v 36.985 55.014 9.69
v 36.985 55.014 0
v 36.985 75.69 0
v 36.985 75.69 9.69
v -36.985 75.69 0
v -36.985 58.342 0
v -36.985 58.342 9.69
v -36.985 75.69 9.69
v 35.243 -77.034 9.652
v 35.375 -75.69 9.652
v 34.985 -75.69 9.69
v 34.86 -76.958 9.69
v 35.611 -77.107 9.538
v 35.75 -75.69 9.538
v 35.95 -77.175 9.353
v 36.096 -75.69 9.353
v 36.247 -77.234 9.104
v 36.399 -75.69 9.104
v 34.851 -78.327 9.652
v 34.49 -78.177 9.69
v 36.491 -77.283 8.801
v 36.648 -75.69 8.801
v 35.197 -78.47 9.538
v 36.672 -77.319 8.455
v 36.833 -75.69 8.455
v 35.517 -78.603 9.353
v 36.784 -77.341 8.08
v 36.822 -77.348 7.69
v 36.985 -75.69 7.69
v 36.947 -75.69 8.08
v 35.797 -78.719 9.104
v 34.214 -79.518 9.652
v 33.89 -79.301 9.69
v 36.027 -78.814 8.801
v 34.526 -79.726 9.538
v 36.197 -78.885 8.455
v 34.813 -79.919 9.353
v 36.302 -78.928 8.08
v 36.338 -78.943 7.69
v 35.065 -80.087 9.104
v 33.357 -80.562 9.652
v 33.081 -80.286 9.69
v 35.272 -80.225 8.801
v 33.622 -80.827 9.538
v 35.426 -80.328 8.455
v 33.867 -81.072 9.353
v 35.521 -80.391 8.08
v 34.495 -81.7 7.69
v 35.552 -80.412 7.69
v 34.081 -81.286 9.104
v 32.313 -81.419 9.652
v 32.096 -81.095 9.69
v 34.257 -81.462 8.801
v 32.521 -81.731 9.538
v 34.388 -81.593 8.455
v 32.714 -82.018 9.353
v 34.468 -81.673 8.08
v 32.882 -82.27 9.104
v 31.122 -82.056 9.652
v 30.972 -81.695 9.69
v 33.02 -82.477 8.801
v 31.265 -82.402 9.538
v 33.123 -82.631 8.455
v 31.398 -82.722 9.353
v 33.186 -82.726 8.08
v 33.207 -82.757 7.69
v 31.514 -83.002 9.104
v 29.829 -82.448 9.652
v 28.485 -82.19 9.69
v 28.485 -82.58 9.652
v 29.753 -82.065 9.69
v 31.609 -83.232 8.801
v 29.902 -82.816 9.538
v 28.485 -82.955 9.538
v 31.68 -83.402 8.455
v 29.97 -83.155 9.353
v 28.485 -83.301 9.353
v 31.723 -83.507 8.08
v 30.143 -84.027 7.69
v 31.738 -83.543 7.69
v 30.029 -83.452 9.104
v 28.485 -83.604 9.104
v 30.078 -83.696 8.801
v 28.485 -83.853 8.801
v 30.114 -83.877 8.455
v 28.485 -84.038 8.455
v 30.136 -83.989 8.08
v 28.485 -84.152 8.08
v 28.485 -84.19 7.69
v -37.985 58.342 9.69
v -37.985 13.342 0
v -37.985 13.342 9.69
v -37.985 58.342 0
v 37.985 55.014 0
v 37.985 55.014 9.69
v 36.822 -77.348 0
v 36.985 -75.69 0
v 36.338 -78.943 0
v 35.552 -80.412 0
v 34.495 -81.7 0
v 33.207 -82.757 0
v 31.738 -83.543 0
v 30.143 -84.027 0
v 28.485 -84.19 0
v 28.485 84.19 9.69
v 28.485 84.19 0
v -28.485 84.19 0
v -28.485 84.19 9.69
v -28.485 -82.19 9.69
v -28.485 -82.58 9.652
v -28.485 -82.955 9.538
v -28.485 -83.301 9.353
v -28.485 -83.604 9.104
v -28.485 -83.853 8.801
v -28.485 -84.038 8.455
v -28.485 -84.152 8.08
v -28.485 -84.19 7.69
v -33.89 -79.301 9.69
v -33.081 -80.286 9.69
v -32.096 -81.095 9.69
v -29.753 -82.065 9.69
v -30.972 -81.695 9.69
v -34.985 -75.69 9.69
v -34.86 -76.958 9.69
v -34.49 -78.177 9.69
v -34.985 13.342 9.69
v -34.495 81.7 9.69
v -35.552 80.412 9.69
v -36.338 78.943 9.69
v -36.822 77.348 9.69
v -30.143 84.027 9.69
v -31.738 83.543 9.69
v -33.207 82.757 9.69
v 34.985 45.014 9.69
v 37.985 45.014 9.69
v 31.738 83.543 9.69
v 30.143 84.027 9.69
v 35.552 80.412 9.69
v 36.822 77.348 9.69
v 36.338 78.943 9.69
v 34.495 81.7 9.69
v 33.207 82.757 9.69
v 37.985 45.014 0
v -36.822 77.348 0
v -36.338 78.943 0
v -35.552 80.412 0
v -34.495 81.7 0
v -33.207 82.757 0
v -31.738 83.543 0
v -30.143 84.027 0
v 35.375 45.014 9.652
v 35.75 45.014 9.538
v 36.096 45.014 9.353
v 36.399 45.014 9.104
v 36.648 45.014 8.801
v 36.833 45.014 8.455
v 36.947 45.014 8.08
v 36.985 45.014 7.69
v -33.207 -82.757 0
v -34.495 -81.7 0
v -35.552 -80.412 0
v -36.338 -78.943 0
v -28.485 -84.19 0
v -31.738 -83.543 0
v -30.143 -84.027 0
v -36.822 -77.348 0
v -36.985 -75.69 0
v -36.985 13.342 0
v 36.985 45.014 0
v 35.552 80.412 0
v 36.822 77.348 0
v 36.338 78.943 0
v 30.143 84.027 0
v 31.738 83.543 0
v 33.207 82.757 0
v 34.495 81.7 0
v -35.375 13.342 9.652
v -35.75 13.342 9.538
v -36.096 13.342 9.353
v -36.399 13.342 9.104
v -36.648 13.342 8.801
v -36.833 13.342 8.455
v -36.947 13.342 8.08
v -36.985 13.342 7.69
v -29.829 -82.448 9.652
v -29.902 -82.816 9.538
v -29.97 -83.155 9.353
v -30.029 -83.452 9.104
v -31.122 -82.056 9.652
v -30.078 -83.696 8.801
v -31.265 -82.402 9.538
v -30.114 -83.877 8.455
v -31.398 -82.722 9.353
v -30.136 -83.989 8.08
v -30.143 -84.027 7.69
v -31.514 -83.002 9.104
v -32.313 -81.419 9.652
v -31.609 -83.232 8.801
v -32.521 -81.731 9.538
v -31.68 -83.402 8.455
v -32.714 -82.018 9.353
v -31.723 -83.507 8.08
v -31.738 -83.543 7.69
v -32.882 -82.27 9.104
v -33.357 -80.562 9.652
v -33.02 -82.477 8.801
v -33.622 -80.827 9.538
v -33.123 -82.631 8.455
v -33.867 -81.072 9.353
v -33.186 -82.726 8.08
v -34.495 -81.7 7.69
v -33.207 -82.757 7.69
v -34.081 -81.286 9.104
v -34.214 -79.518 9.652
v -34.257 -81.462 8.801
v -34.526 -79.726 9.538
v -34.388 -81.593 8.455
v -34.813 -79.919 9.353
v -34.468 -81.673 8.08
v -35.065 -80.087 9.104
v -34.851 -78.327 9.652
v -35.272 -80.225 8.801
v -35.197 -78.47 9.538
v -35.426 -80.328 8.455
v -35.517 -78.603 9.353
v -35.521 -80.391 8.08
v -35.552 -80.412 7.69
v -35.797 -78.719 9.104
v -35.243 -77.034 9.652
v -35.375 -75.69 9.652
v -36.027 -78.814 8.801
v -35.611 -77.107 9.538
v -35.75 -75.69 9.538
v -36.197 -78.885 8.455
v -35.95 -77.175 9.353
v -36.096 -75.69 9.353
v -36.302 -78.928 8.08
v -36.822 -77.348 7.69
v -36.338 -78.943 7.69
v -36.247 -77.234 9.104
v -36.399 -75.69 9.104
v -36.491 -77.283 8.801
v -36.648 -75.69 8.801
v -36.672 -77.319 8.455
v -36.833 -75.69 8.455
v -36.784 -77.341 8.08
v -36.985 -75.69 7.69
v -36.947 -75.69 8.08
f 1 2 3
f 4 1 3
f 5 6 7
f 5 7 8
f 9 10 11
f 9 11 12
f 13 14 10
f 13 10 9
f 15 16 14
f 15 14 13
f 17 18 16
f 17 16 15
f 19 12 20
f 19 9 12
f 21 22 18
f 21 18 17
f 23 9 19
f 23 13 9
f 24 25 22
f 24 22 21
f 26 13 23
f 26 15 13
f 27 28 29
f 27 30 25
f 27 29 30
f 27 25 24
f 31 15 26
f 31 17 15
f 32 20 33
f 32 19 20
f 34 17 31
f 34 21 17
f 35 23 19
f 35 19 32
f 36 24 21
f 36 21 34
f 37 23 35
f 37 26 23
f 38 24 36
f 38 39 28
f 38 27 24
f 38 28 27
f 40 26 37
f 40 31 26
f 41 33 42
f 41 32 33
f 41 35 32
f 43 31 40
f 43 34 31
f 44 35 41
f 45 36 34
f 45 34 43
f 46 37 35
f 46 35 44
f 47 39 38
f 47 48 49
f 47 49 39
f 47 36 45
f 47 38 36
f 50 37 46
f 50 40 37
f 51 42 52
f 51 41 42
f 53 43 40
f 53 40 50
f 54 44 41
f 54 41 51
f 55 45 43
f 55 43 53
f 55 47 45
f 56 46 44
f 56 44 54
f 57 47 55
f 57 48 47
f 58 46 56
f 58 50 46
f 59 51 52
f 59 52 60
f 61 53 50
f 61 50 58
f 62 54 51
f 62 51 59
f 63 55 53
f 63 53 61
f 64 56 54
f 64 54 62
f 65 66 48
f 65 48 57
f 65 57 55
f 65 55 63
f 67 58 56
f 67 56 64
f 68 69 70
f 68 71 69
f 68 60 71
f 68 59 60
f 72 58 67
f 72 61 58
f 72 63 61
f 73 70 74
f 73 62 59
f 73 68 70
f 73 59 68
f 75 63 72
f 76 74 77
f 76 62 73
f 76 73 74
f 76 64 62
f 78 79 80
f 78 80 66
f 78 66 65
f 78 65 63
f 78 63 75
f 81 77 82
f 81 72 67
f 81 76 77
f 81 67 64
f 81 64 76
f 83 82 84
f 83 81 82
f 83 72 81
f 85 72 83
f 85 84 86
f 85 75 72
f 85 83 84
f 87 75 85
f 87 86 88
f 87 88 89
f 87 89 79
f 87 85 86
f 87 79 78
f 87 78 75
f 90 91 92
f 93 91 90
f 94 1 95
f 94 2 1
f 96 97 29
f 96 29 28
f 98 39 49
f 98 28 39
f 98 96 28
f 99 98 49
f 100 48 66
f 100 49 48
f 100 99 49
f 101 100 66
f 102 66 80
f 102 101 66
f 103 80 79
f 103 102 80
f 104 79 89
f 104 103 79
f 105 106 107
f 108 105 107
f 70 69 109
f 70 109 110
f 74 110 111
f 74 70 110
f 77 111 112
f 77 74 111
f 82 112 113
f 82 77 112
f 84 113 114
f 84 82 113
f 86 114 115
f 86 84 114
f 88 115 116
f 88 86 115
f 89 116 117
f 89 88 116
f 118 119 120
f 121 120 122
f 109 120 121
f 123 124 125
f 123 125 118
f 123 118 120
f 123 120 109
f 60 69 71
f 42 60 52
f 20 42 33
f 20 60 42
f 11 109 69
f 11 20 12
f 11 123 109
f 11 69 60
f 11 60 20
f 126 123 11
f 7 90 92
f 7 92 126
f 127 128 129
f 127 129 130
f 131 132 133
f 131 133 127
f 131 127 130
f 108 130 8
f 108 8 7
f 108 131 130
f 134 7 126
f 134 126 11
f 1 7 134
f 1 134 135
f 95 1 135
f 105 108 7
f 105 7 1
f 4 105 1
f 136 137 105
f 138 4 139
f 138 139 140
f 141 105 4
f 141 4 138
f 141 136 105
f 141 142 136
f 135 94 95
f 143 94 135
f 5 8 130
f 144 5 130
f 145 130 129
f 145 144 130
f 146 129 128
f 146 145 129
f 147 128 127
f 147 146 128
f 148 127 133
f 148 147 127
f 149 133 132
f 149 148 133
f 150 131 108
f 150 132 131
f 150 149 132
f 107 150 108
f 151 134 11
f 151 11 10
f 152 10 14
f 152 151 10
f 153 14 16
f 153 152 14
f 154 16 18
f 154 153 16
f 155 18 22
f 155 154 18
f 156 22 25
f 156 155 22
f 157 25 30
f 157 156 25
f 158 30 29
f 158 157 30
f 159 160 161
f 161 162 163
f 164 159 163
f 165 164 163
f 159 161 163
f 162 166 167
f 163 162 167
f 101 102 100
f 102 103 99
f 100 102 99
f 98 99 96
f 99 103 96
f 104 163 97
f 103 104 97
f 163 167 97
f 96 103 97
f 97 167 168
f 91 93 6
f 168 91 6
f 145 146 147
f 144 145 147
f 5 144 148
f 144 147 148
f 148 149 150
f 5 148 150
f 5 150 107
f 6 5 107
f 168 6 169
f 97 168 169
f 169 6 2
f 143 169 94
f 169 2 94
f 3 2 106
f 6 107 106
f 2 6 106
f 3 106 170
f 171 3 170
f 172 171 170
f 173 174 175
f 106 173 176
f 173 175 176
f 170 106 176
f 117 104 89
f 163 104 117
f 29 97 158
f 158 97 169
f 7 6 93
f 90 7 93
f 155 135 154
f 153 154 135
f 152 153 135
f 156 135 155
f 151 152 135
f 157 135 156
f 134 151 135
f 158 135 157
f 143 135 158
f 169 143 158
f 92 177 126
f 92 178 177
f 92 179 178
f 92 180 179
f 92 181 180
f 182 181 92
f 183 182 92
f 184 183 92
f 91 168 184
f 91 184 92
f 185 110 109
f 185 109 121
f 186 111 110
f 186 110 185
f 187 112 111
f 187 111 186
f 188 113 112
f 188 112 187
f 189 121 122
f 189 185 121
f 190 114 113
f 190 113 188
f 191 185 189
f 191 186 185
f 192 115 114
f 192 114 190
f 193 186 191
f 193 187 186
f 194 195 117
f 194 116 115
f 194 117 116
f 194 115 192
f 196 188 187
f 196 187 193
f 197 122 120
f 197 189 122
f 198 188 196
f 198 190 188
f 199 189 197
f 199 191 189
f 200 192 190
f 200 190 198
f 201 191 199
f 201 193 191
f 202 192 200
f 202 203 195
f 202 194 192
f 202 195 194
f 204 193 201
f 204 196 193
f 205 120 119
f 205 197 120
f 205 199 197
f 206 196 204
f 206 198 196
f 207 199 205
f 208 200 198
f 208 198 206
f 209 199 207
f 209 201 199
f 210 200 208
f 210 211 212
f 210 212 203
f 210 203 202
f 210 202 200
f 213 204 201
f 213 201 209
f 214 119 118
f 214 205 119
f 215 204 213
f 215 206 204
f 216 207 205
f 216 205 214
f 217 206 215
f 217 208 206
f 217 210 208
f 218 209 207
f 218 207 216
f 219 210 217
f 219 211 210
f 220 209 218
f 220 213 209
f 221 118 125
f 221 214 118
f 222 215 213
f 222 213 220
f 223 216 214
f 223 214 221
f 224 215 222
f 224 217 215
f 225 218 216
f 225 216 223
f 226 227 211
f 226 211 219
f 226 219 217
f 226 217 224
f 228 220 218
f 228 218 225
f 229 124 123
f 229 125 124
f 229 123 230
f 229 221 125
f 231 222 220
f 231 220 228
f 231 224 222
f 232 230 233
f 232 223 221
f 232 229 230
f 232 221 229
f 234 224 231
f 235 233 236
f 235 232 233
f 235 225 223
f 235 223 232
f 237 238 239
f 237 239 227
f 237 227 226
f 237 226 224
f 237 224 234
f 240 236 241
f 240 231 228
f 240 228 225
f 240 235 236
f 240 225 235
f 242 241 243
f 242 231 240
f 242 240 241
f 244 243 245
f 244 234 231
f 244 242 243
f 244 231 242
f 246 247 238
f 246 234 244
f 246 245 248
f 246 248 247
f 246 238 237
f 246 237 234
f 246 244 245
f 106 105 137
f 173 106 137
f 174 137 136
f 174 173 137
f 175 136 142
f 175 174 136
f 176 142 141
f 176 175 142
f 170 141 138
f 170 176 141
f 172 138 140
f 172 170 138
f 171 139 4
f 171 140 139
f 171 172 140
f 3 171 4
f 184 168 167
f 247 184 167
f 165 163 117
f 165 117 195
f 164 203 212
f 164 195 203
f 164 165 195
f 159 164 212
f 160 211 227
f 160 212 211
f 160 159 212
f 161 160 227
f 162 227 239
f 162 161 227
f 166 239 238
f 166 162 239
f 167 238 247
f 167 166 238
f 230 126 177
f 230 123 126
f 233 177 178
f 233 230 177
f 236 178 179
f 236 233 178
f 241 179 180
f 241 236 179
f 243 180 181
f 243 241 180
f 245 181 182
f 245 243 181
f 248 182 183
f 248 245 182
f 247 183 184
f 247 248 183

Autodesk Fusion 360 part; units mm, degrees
sketch "Sketch1" plane through (0, 0, 0) normal (0, 0, 1) x (1, 0, 0)
  line L0 (28.485, 84.19) -> (0, 84.19)
  line L1 (36.985, 0) -> (36.985, 75.69)
  line L2 (0, 0) -> (0, 84.19) construction
  line L3 (0, 0) -> (36.985, 0) construction
  arc A0 (36.985, 75.69) -> (28.485, 84.19) centre (28.485, 75.69) ccw
  line L4 (-28.485, 84.19) -> (0, 84.19)
  arc A1 (-28.485, 84.19) -> (-36.985, 75.69) centre (-28.485, 75.69) ccw
  line L5 (-36.985, 0) -> (-36.985, 75.69)
  line L6 (36.985, 0) -> (36.985, -75.69)
  arc A2 (28.485, -84.19) -> (36.985, -75.69) centre (28.485, -75.69) ccw
  line L7 (28.485, -84.19) -> (0, -84.19)
  line L8 (-28.485, -84.19) -> (0, -84.19)
  arc A3 (-36.985, -75.69) -> (-28.485, -84.19) centre (-28.485, -75.69) ccw
  line L9 (-36.985, 0) -> (-36.985, -75.69)
  line L10 (-36.985, 58.3417) -> (-37.985, 58.3417)
  line L11 (-37.985, 58.3417) -> (-37.985, 38.3417)
  line L12 (-37.985, 38.3417) -> (-36.985, 38.3417)
  line L13 (-36.985, 38.3417) -> (-36.985, 58.3417)
  line L14 (-37.985, 38.3417) -> (-36.985, 38.3417)
  line L15 (-36.985, 38.3417) -> (-36.985, 13.3417)
  line L16 (-36.985, 13.3417) -> (-37.985, 13.3417)
  line L17 (-37.985, 13.3417) -> (-37.985, 38.3417)
  line L18 (36.985, 55.0141) -> (37.985, 55.0141)
  line L19 (37.985, 55.0141) -> (37.985, 45.0141)
  line L20 (37.985, 45.0141) -> (36.985, 45.0141)
  line L21 (36.985, 45.0141) -> (36.985, 55.0141)
  dimension "d3" = 8.5
  dimension "d4" = 1
  dimension "d5" = 20
  dimension "d6" = 25
  dimension "d7" = 1
  dimension "d8" = 10
extrude "Extrude1" add sketch "Sketch1" along normal blind 9.69
fillet "Fillet1" radius 2 5 edges at (-36.985, -31.1741, 9.69) (-34.4954, -81.7004, 9.69) (0, -84.19, 9.69) (34.4954, -81.7004, 9.69) (36.985, -15.3379, 9.69)
